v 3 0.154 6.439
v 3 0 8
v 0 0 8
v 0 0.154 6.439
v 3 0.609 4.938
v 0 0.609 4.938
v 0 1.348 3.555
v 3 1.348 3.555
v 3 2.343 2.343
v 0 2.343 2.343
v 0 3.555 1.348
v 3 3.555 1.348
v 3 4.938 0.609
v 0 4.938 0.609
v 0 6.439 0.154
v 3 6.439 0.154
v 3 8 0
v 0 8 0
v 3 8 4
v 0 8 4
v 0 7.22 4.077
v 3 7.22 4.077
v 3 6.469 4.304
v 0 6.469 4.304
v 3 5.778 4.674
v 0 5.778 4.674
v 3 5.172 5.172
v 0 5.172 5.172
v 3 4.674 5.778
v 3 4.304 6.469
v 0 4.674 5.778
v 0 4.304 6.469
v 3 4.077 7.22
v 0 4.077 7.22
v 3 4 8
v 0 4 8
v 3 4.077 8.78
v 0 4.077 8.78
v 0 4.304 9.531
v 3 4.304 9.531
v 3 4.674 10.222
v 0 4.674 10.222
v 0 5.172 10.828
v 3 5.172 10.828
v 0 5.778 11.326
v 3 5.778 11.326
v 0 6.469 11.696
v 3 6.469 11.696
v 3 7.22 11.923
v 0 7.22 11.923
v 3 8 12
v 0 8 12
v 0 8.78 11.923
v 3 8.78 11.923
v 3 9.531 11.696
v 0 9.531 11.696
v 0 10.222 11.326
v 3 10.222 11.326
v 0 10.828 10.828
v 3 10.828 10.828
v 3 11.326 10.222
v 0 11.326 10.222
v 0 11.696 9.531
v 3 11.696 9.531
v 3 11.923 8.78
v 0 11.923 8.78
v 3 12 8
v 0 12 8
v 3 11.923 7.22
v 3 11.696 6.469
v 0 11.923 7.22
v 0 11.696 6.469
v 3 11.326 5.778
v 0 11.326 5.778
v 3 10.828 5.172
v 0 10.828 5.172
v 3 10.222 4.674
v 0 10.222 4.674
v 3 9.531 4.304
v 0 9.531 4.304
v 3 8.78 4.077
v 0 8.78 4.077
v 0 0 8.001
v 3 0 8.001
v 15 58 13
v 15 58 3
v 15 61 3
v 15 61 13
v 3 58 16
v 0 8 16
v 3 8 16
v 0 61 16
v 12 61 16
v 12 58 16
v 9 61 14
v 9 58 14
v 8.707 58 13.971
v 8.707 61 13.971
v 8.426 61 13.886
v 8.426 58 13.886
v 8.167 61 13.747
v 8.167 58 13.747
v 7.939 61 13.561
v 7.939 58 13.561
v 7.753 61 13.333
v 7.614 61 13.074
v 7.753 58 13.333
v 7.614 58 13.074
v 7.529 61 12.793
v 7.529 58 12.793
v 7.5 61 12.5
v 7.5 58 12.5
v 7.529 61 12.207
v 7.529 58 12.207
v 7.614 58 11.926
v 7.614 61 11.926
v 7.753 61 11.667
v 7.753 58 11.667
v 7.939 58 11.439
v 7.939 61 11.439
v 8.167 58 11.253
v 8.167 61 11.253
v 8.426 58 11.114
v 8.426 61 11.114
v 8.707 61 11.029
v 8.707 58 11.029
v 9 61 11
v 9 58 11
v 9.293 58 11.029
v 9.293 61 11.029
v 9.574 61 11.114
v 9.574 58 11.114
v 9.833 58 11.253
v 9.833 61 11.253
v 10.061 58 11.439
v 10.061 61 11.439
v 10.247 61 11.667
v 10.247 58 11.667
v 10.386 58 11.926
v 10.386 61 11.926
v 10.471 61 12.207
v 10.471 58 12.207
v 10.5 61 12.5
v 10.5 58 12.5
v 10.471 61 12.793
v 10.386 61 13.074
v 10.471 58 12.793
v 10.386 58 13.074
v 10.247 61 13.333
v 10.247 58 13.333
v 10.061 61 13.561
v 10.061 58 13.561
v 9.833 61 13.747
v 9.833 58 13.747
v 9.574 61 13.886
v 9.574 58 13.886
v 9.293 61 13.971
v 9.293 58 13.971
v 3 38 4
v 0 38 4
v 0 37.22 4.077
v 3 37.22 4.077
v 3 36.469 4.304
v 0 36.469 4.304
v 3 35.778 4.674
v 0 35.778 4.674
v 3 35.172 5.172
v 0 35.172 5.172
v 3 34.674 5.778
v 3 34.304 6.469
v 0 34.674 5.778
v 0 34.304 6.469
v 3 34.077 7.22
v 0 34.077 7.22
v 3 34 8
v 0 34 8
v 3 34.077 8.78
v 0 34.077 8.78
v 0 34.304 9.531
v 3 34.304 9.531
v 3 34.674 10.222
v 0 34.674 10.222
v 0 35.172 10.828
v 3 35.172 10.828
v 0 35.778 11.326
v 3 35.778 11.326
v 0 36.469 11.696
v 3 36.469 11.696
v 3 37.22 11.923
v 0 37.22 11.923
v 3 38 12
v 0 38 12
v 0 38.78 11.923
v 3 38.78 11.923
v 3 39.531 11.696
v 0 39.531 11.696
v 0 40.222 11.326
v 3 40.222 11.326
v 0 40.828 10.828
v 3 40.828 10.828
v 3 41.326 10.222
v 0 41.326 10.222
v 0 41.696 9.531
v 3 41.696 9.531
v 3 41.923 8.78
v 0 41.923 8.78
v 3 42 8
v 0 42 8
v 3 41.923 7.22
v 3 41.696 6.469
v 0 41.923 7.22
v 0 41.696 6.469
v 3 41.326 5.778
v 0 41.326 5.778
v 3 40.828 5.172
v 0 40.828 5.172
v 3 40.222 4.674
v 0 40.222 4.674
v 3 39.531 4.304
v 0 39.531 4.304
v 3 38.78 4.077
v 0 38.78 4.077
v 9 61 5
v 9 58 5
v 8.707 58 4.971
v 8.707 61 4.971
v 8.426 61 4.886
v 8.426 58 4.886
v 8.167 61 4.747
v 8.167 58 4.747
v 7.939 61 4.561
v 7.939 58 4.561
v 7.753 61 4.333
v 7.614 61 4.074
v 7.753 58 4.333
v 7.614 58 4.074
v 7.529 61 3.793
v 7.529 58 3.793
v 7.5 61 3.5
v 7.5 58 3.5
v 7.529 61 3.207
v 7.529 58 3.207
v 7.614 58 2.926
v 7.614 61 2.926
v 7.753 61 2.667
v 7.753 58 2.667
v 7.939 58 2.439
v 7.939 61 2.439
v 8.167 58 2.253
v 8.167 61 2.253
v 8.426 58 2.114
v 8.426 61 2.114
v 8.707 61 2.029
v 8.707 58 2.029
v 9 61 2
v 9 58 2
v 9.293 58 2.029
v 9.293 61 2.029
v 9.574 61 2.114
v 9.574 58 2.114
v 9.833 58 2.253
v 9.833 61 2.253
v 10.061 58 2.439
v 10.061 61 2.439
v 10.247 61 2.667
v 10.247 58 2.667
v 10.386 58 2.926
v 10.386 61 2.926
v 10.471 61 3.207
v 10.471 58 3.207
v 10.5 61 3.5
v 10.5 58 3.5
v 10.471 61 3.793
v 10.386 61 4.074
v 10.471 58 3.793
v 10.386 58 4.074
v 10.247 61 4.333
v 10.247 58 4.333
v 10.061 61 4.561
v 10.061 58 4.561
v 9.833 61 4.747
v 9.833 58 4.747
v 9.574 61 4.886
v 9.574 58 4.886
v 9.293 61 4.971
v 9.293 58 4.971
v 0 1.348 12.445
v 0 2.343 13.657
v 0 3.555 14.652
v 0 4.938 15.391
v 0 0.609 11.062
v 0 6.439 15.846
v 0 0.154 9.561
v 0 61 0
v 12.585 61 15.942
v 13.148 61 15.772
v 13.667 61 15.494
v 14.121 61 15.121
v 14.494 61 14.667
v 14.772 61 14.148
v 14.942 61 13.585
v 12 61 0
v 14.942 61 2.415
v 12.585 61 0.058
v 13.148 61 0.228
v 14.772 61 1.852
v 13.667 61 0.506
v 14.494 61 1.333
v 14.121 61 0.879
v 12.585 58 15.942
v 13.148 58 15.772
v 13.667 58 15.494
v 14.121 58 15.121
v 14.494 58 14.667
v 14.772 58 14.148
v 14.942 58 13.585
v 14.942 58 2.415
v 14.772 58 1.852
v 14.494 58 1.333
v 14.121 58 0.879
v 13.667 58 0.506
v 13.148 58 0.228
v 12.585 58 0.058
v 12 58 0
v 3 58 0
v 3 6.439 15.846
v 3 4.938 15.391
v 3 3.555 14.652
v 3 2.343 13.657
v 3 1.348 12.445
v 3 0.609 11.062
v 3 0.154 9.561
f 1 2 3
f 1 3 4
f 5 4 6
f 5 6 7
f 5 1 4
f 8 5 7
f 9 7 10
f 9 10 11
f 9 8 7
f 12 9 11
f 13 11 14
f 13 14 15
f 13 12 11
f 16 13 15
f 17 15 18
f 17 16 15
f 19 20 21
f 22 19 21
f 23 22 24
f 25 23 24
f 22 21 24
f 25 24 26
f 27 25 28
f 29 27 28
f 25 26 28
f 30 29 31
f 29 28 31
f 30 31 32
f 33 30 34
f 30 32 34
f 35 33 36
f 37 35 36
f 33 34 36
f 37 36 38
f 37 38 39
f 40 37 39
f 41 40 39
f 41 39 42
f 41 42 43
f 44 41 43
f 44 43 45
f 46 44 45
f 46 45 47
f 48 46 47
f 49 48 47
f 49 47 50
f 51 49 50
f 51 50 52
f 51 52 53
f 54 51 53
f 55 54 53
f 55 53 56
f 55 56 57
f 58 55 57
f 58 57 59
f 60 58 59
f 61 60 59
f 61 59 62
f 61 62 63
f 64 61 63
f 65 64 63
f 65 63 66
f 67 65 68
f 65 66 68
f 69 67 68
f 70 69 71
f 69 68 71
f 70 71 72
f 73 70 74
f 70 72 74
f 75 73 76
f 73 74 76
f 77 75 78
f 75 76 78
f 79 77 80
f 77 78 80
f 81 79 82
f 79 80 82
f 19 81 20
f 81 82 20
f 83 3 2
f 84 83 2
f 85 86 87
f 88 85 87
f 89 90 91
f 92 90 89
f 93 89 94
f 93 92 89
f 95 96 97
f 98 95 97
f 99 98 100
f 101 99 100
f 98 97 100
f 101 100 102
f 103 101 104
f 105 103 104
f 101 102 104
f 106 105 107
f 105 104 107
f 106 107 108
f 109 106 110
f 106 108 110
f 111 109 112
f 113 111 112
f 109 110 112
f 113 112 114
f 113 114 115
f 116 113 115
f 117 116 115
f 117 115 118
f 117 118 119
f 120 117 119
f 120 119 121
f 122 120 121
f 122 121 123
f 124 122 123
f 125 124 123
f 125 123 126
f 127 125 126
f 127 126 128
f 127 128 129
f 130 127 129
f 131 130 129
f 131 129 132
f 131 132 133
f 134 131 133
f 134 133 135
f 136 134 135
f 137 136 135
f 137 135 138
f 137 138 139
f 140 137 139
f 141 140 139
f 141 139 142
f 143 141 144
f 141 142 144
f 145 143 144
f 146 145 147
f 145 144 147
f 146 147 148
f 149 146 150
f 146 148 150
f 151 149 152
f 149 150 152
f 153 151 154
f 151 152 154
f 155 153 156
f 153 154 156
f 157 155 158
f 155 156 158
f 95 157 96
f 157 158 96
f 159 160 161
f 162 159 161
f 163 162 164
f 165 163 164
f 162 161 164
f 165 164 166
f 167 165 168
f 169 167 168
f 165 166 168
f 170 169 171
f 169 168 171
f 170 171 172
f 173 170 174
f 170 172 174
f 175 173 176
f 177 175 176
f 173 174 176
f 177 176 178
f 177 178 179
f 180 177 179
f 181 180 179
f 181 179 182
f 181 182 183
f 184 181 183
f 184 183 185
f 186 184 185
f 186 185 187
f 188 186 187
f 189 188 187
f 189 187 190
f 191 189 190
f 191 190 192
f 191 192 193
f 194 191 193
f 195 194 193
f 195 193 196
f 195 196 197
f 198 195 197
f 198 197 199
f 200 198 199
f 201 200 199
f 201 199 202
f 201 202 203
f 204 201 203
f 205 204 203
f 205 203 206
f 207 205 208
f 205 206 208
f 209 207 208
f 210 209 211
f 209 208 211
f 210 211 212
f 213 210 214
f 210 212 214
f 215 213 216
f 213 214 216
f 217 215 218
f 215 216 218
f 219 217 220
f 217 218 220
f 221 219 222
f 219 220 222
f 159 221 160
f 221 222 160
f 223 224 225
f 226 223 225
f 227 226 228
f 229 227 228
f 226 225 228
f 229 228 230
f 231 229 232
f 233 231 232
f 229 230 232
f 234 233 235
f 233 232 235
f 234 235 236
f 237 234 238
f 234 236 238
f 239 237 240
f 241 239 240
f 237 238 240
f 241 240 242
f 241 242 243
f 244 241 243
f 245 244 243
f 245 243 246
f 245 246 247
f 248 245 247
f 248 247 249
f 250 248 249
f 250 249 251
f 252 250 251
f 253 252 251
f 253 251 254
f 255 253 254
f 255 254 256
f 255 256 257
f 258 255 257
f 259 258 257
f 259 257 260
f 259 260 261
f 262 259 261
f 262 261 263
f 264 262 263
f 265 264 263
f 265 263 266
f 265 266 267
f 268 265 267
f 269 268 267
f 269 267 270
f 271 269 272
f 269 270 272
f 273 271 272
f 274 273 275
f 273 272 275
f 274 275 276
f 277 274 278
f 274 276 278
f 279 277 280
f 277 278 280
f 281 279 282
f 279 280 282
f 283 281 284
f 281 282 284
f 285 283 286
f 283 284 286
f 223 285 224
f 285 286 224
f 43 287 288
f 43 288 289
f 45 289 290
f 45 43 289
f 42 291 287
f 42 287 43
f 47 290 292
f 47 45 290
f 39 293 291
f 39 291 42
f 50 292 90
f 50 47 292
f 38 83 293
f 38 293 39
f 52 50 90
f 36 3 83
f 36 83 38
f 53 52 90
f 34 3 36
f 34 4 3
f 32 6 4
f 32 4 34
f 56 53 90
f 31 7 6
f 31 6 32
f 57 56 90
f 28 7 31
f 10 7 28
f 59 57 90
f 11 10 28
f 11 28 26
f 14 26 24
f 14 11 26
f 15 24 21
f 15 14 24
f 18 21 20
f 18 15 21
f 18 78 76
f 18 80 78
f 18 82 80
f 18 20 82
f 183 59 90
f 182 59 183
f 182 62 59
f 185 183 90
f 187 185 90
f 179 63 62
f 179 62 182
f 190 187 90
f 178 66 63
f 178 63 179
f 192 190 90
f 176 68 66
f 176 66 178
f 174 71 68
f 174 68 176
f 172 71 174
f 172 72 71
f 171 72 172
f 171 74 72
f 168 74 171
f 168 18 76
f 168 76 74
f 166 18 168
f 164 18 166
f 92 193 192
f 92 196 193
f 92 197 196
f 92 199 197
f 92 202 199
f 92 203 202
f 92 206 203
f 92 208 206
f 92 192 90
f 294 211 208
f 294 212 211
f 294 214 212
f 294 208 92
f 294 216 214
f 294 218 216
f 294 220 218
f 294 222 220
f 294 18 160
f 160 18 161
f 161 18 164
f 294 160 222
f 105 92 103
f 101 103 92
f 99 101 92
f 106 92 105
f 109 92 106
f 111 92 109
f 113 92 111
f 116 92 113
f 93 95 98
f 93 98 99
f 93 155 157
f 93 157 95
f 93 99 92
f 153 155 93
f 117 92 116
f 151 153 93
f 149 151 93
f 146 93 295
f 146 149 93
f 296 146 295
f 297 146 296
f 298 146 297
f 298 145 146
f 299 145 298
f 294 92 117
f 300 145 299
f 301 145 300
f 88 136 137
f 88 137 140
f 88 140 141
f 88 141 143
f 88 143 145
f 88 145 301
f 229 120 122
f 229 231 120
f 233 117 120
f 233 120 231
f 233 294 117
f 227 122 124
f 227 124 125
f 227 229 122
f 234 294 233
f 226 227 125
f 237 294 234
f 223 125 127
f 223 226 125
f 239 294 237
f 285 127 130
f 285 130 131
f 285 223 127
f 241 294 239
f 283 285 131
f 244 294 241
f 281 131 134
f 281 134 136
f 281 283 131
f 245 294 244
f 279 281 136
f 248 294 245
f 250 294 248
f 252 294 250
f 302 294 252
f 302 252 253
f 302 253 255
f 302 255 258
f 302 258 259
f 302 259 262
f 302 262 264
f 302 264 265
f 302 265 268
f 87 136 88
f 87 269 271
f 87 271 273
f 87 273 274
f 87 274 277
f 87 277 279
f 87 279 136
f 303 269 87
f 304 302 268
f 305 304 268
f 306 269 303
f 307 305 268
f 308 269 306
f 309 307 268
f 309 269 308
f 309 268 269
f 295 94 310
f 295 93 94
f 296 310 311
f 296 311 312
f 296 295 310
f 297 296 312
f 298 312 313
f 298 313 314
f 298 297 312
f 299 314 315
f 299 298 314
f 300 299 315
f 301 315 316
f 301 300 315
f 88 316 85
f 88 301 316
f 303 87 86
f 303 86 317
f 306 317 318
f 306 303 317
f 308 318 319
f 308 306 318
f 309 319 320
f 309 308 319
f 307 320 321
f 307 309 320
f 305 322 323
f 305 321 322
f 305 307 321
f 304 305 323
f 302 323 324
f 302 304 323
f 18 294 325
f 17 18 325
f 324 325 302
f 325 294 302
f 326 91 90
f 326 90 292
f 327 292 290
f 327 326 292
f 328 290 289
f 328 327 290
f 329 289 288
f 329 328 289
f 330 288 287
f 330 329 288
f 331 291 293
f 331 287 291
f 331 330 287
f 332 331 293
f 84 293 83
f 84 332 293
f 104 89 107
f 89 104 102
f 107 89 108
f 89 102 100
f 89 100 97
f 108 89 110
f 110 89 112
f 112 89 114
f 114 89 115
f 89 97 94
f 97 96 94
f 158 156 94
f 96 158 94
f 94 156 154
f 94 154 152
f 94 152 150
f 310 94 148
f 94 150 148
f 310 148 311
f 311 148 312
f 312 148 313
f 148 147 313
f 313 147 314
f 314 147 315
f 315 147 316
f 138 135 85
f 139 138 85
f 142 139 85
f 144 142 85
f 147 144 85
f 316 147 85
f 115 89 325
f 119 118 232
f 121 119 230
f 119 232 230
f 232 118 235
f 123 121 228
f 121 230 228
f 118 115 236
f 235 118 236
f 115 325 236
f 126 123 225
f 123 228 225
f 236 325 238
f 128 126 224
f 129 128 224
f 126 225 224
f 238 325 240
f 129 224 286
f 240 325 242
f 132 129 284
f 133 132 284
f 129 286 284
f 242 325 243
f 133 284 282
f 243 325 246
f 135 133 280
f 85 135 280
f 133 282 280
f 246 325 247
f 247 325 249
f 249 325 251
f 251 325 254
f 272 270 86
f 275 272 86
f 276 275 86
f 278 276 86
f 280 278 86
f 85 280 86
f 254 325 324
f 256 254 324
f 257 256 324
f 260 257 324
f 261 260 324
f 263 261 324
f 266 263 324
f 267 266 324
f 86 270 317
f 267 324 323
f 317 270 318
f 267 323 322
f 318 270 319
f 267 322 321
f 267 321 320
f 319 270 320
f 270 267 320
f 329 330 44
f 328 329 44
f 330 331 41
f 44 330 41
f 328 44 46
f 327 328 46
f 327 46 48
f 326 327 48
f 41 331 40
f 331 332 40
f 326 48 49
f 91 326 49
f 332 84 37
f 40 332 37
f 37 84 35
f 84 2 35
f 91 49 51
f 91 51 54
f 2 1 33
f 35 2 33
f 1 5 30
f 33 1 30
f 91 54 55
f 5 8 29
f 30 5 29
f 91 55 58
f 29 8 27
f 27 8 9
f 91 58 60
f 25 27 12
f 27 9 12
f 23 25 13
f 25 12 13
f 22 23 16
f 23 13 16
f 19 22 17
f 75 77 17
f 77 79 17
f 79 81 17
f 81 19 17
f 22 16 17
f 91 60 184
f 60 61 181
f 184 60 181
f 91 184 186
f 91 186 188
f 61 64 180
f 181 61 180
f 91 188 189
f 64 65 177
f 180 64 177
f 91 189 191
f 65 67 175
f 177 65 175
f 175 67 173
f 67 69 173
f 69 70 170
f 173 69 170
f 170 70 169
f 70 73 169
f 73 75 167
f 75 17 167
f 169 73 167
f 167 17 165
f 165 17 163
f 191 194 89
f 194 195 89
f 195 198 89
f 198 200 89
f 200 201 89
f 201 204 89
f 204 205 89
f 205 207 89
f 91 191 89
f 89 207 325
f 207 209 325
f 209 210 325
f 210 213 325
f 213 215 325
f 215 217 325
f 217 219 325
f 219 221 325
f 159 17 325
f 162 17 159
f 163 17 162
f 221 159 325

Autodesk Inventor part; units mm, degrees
ref_plane "YZ Plane" through (0, 0, 0) normal (1, 0, 0) x (0, 1, 0)
ref_plane "XZ Plane" through (0, 0, 0) normal (0, 1, 0) x (-1, 0, 0)
ref_plane "XY Plane" through (0, 0, 0) normal (0, 0, 1) x (1, 0, 0)
sketch "Sketch1" plane through (0, 0, 0) normal (0, 0, 1) x (1, 0, 0)
  line L0 (0, 0) -> (0, 61)
  line L1 (3, 0) -> (3, 58)
  line L2 (0, 0) -> (3, 0)
  line L3 (3, 58) -> (15, 58)
  line L4 (0, 61) -> (15, 61)
  line L5 (15, 58) -> (15, 61)
  point P0 (9, 61)
  dimension "d0" = 61
  dimension "d2" = 3
  dimension "d3" = 12
  dimension "d4" = 3
extrude "Extrusion1" add sketch "Sketch1" along normal blind 16
fillet "Fillet1" radius 8 2 edges at (1.5, 0, 16) (1.5, 0, 0)
sketch "Sketch2" plane through (3, 58, 16) normal (1, 0, 0) x (0, 0, -1)
  arc A0 (0, -50) -> (16, -50) centre (8, -50) ccw construction
  line L0 (16, -50) -> (16, 0) construction
  line L1 (16, 0) -> (0, 0) construction
  line L2 (0, -50) -> (0, 0) construction
  line L3 (16, 3) -> (0, 3) projected
  point P0 (16, -58)
  point P1 (8, -20)
  dimension "d8" = 30
  dimension "d9" = 23
  dimension "d10" = 8
  dimension "d11" = 8
hole "Hole1" at (3, 8, 8) at (3, 38, 8) direction (-1, 0, 0) diameter 8 end through all
sketch "Sketch3" plane through (0, 61, 0) normal (0, 1, 0) x (1, 0, 0)
  line L0 (15, 0) -> (0, 0) projected
  line L1 (0, 0) -> (0, -16) projected
  line L2 (15, -16) -> (0, -16) projected
  line L3 (15, 0) -> (15, -16) projected
  point P0 (9, -12.5)
  point P1 (9, -3.5)
  point P2 (0, -8)
  dimension "d19" = 9
  dimension "d20" = 9
  dimension "d21" = 4.5
hole "Hole2" at (9, 61, 12.5) at (9, 61, 3.5) direction (0, -1, 0) diameter 3 end through all
fillet "Fillet2" radius 3 2 edges at (15, 59.5, 16) (15, 59.5, 0)
properties part number "HUDSON-1-75"
